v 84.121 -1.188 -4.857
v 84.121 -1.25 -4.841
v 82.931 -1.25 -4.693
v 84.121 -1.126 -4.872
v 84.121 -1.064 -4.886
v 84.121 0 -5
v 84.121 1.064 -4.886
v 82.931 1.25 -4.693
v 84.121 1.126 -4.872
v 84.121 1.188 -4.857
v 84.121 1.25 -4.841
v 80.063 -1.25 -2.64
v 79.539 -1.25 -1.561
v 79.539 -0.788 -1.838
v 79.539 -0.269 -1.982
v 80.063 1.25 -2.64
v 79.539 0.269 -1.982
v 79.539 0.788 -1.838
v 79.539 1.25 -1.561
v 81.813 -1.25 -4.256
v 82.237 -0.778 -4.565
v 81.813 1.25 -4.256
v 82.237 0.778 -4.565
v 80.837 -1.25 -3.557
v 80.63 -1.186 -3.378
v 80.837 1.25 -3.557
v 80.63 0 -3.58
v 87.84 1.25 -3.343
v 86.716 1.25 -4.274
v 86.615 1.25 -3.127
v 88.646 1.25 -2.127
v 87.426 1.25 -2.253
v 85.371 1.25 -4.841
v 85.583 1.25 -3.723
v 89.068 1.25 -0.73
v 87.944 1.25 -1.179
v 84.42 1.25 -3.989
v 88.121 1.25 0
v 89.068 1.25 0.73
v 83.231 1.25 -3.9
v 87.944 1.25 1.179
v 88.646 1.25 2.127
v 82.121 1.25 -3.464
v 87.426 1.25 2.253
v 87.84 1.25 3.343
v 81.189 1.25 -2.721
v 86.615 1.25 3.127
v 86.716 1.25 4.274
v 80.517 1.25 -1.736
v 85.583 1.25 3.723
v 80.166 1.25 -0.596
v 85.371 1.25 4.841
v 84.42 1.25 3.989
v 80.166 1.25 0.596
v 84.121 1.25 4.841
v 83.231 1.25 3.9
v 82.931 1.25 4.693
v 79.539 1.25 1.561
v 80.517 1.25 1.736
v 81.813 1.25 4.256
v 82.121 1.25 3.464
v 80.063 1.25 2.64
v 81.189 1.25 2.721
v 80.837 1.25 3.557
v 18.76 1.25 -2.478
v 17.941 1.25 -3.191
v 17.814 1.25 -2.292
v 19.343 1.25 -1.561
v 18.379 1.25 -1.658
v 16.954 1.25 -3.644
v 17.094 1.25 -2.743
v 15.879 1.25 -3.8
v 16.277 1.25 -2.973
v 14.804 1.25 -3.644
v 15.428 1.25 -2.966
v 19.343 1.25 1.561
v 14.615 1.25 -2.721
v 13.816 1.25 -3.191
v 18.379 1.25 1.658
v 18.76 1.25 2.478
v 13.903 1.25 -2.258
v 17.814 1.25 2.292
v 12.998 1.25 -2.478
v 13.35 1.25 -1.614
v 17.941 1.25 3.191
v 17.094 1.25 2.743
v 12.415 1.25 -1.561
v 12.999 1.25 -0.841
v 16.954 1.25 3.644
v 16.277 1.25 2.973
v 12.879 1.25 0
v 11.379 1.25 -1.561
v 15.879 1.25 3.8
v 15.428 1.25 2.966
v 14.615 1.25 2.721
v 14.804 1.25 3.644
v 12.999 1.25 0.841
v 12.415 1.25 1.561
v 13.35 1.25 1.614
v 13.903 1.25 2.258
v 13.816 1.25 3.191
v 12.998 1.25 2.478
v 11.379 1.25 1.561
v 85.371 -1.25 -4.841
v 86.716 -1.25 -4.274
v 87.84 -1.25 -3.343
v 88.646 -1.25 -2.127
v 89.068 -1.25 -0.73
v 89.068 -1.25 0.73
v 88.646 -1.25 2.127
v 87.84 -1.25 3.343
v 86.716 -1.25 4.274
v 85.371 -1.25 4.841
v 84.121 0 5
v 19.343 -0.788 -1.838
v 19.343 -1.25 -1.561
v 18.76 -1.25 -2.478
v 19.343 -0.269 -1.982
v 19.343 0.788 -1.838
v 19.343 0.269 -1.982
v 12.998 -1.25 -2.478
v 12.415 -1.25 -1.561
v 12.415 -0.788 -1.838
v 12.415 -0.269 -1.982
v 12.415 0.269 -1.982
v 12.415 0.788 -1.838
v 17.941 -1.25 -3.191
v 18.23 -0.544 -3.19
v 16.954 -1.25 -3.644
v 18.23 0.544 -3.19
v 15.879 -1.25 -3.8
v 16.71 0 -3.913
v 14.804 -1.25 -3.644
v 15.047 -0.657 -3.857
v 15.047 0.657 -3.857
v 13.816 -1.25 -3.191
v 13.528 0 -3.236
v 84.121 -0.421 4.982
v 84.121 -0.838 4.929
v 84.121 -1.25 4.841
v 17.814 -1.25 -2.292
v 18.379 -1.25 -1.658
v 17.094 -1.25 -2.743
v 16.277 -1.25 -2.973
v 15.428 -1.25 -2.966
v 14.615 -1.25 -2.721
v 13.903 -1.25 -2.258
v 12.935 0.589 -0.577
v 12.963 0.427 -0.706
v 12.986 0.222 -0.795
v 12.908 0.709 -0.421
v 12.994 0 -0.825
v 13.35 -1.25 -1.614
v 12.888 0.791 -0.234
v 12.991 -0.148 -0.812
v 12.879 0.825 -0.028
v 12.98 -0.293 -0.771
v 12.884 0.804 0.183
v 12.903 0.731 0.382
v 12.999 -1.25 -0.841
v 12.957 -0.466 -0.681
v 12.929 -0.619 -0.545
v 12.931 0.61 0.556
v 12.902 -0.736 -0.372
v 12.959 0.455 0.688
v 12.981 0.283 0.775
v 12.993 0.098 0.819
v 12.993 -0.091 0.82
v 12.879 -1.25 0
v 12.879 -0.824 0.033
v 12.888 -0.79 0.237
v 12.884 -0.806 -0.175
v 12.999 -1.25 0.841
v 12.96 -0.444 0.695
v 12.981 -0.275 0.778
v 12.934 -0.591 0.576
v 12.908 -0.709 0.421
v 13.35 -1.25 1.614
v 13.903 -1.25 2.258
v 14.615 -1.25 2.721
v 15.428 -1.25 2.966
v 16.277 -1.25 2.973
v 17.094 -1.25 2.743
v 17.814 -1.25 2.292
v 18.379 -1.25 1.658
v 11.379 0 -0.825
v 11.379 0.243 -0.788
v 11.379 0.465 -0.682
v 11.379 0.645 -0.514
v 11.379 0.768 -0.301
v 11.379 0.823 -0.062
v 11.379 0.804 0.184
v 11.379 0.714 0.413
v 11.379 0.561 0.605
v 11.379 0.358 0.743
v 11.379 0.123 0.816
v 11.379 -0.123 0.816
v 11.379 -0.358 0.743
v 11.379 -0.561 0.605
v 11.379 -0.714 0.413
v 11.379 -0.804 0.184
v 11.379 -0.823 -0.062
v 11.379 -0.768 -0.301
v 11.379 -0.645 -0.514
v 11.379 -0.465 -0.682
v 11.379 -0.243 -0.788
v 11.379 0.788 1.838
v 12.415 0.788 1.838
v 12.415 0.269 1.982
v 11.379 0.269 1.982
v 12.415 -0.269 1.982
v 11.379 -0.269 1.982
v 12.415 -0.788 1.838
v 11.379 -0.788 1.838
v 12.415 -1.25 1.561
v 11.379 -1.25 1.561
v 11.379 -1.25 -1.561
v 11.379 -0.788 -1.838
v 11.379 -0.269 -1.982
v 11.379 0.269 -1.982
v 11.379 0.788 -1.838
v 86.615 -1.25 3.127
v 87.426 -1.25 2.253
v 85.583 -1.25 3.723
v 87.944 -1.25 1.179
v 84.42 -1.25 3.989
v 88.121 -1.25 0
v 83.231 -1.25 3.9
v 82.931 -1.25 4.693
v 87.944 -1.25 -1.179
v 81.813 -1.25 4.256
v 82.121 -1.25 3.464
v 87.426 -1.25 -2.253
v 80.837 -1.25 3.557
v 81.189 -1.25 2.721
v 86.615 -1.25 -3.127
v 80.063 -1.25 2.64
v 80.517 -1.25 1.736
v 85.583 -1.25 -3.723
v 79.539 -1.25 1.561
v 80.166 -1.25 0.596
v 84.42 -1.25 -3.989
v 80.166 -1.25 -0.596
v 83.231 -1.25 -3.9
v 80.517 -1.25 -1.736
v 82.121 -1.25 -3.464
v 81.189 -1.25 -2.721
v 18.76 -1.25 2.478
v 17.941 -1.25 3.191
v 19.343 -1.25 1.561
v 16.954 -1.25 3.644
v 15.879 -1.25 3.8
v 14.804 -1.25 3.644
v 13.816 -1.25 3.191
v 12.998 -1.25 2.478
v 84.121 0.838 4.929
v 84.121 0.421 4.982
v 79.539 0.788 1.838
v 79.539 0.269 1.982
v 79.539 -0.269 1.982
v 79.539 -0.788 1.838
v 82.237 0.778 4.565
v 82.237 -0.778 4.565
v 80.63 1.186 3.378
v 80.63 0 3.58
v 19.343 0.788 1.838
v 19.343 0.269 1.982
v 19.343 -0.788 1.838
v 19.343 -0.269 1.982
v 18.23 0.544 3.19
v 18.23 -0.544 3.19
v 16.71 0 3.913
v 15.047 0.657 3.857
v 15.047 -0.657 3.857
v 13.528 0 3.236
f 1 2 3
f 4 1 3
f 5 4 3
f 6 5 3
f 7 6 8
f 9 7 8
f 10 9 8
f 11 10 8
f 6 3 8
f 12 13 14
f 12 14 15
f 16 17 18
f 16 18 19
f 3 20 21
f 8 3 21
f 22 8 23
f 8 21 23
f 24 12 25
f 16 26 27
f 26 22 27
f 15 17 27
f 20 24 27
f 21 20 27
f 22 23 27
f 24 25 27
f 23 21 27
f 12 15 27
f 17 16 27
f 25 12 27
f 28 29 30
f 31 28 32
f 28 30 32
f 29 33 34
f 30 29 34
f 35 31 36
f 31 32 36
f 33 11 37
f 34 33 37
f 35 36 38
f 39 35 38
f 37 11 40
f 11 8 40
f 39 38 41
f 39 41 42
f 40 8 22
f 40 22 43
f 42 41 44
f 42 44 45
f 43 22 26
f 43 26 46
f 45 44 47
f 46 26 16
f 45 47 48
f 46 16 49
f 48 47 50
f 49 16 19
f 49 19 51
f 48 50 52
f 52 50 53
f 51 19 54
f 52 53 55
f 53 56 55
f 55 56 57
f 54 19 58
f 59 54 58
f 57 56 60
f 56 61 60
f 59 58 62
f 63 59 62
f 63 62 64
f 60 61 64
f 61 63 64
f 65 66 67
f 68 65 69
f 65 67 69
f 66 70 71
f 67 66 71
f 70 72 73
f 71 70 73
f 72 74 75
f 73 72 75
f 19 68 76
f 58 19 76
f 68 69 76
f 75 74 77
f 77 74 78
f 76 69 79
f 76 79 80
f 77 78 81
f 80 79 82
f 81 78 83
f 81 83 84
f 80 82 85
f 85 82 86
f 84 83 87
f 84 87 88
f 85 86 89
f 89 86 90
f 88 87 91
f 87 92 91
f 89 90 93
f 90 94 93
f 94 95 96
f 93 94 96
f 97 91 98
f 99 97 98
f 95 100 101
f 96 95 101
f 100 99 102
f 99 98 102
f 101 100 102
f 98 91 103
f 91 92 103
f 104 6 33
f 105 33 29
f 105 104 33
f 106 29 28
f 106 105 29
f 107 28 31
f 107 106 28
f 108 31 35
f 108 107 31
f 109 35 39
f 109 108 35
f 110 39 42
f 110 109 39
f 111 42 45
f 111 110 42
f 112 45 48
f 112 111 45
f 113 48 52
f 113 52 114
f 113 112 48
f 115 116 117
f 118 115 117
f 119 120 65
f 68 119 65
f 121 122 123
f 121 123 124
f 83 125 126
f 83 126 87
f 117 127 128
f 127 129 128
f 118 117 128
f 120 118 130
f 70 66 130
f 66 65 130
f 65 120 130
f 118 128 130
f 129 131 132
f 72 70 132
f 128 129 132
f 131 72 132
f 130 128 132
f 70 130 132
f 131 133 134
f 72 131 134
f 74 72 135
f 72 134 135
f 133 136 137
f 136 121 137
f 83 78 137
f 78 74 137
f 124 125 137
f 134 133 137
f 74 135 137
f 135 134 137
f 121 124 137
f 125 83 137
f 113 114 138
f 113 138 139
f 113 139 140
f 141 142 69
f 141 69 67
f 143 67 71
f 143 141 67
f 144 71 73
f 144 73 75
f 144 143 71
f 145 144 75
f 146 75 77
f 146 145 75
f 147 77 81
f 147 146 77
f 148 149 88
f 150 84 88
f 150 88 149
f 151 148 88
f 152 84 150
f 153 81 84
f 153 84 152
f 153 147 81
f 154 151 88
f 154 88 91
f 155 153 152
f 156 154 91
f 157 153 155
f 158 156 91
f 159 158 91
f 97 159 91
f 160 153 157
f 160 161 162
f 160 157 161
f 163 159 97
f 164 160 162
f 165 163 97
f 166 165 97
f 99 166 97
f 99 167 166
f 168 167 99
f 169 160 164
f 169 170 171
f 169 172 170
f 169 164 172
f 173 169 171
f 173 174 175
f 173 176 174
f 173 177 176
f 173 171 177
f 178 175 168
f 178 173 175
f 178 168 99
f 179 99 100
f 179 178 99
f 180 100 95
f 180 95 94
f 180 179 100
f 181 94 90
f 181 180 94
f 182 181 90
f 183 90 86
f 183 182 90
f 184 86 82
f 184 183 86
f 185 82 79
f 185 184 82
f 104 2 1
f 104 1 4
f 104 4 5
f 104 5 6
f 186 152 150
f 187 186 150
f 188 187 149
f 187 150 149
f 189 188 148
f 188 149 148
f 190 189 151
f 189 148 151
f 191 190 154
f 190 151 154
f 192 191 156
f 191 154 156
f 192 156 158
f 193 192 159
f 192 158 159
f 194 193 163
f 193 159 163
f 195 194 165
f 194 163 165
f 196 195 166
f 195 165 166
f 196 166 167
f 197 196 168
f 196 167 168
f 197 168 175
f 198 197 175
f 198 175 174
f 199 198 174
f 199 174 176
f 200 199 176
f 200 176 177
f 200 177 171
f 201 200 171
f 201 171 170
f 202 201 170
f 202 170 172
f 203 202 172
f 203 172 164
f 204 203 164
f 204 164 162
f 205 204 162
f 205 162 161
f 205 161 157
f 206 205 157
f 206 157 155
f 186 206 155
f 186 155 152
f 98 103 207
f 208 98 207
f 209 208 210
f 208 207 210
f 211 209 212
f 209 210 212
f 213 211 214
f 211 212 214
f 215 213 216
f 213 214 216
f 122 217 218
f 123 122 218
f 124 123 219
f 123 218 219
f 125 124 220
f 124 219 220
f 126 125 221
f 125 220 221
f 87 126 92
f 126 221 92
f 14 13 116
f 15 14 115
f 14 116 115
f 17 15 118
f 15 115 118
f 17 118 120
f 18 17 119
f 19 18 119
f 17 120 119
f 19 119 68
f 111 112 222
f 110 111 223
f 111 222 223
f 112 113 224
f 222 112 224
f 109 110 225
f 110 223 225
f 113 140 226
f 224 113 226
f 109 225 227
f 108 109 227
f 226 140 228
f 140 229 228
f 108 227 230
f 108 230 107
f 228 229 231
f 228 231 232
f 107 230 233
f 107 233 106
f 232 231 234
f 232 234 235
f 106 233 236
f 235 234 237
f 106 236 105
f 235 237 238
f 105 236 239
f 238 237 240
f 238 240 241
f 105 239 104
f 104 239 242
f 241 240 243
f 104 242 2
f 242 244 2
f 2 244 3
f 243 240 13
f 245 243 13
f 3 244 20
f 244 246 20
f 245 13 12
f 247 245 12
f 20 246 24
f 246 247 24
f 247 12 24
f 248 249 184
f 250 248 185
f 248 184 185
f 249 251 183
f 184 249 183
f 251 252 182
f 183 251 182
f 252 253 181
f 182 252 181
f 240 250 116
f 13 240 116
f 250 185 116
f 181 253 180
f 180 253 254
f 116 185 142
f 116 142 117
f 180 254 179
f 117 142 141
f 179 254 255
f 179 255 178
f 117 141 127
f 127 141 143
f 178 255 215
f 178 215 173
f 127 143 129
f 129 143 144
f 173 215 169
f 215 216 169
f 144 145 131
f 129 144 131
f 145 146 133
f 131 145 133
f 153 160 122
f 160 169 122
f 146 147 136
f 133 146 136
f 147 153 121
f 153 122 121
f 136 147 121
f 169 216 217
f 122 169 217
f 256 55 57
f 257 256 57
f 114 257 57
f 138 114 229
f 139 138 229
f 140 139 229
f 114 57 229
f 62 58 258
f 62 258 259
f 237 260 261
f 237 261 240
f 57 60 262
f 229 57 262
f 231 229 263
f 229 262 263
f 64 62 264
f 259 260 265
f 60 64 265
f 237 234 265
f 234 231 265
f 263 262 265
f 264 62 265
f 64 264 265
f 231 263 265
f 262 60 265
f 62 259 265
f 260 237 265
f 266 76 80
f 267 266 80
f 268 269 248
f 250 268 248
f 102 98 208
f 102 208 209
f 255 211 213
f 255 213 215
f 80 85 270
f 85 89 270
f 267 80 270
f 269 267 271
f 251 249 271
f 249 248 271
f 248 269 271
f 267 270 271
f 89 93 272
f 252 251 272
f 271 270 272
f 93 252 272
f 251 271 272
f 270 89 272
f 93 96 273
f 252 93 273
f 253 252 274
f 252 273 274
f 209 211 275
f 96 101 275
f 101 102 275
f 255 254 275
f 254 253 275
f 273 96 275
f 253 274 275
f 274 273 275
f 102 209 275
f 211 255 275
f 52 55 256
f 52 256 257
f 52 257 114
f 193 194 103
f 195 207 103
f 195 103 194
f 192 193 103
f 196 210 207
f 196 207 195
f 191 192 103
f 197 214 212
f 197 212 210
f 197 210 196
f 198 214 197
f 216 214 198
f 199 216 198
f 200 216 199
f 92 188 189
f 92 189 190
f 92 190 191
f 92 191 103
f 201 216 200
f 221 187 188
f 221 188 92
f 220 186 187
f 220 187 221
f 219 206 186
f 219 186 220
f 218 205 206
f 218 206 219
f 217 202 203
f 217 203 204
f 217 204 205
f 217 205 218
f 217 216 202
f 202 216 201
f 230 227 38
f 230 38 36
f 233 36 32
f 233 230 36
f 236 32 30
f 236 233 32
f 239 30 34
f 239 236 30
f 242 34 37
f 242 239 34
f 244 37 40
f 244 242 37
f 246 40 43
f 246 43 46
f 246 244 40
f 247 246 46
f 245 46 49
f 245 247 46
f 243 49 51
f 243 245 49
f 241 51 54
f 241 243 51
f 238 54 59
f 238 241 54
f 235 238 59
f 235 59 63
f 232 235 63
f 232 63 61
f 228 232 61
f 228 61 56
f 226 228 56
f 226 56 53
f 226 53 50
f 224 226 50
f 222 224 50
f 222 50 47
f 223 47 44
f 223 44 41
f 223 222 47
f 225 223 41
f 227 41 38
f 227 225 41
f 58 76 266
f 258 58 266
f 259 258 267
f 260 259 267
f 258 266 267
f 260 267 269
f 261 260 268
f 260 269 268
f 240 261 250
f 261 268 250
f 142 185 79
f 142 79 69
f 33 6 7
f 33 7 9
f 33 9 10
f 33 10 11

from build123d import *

# Parameters (mm, degrees)
EXTRUDE_1_DEPTH          = 100
CUT_EXTRUDE_START        = -2.5
CUT_EXTRUDE_1_OUTLINE_W  = 107.411770938
CUT_EXTRUDE_1_OUTLINE_H  = 17.637554046
CUT_EXTRUDE_1_OUTLINE_R  = 4
CUT_EXTRUDE_1_DEPTH      = 2.5
CUT_EXTRUDE_2_DEPTH      = 100
CUT_EXTRUDE_2_DEPTH_BACK = 100
SKETCH_6_W               = 1
SKETCH_6_H               = 5
M2X0_35_1_D              = 1.65
M2X0_35_1_DEPTH          = 2
M2X0_35_1_TIP            = 0.495710011


# Read off the part's stored shape, not the designer's step: 切除-拉伸1
with BuildPart() as part:
    # 草图1 → 凸台-拉伸1 (new body)
    with BuildSketch(Plane(origin=(0, 0, 0), x_dir=(0, 0, -1), z_dir=(1, 0, 0))):
        with BuildLine():
            Line((4.841229183, 1.25), (0, 1.25))
            Line((0, 1.25), (0, -1.25))
            Line((0, -1.25), (4.841229183, -1.25))
            ThreePointArc((4.841229183, -1.25), (4.960148481, -0.630021462), (5, 0))
            ThreePointArc((5, 0), (4.960148481, 0.630021462), (4.841229183, 1.25))
        make_face()
        with BuildLine():
            Line((0, -1.25), (0, 1.25))
            Line((0, 1.25), (-4.841229183, 1.25))
            ThreePointArc((-4.841229183, 1.25), (-5, 0), (-4.841229183, -1.25))
            Line((-4.841229183, -1.25), (0, -1.25))
        make_face()
    extrude(amount=EXTRUDE_1_DEPTH)

    # 切除-拉伸1 outline → 切除-拉伸1 (cut)
    # profile 1 of 3: a face of its own
    with BuildSketch(Plane(origin=(0, 1.25, 0), x_dir=(1, 0, 0), z_dir=(0, 1, 0)).offset(CUT_EXTRUDE_START)):
        with Locations((50.551661955, -0.114939413)):
            Rectangle(CUT_EXTRUDE_1_OUTLINE_W, CUT_EXTRUDE_1_OUTLINE_H)
        with BuildLine():
            Line((15.8786768, 5), (84.1213232, 5))
            ThreePointArc((84.1213232, 5), (89.1213232, 0), (84.1213232, -5))
            Line((84.1213232, -5), (15.8786768, -5))
            ThreePointArc((15.8786768, -5), (10.8786768, 0), (15.8786768, 5))
        make_face(mode=Mode.SUBTRACT)
    # profile 2 of 3: a face of its own
    with BuildSketch(Plane(origin=(0, 1.25, 0), x_dir=(1, 0, 0), z_dir=(0, 1, 0)).offset(CUT_EXTRUDE_START)):
        with BuildLine():
            Line((18.3786768, -1.658312395), (18.3786768, 1.658312395))
            ThreePointArc((18.3786768, 1.658312395), (12.8786768, 0), (18.3786768, -1.658312395))
        make_face()
    # profile 3 of 3: a face of its own
    with BuildSketch(Plane(origin=(0, 1.25, 0), x_dir=(1, 0, 0), z_dir=(0, 1, 0)).offset(CUT_EXTRUDE_START)):
        with Locations((84.1213232, 0)):
            Circle(CUT_EXTRUDE_1_OUTLINE_R)
    extrude(amount=CUT_EXTRUDE_1_DEPTH, mode=Mode.SUBTRACT)

    # 草图3 → 切除-旋转2 (revolve, cut)
    with BuildSketch(Plane(origin=(0, 0, 0), x_dir=(1, 0, 0), z_dir=(0, 1, 0))):
        with BuildLine():
            Line((12.414575185, -2), (10.590757267, -2))
            Line((10.590757267, -2), (10.590757267, -5))
            Line((10.590757267, -5), (84.1213232, -5))
            ThreePointArc((84.1213232, -5), (81.382710412, -4.183300133), (79.538747505, -2))
            Line((79.538747505, -2), (19.342778415, -2))
            ThreePointArc((19.342778415, -2), (15.8786768, -4), (12.414575185, -2))
        make_face()
        with BuildLine():
            Line((10.590757267, 5), (10.590757267, 2))
            Line((10.590757267, 2), (12.414575185, 2))
            ThreePointArc((12.414575185, 2), (15.8786768, 4), (19.342778415, 2))
            Line((19.342778415, 2), (79.538747505, 2))
            ThreePointArc((79.538747505, 2), (81.382710412, 4.183300133), (84.1213232, 5))
            Line((84.1213232, 5), (10.590757267, 5))
        make_face()
    revolve(axis=Axis((10.590757267, 0, 0), (1, 0, 0)), mode=Mode.SUBTRACT)

    # 草图6 → 切除-拉伸2 (cut, two sides: drawn at the far end of the back side and taken through both)
    with BuildSketch(Plane(origin=(0, 0, 0), x_dir=(1, 0, 0), z_dir=(0, 1, 0)).offset(-CUT_EXTRUDE_2_DEPTH_BACK)):
        with Locations((10.8786768, 0)):
            Rectangle(SKETCH_6_W, SKETCH_6_H)
    extrude(amount=CUT_EXTRUDE_2_DEPTH + CUT_EXTRUDE_2_DEPTH_BACK, mode=Mode.SUBTRACT)

    # M2X0.35 螺纹孔的螺纹孔钻头1
    with Locations(Plane.ZY.offset(-11.3786768)):
        with Locations((0, 0)):
            Hole(M2X0_35_1_D / 2, depth=M2X0_35_1_DEPTH)
            with Locations((0, 0, -(M2X0_35_1_DEPTH + M2X0_35_1_TIP / 2))):  # 118° drill point
                Cone(0, M2X0_35_1_D / 2, M2X0_35_1_TIP, mode=Mode.SUBTRACT)


solid = part.part
